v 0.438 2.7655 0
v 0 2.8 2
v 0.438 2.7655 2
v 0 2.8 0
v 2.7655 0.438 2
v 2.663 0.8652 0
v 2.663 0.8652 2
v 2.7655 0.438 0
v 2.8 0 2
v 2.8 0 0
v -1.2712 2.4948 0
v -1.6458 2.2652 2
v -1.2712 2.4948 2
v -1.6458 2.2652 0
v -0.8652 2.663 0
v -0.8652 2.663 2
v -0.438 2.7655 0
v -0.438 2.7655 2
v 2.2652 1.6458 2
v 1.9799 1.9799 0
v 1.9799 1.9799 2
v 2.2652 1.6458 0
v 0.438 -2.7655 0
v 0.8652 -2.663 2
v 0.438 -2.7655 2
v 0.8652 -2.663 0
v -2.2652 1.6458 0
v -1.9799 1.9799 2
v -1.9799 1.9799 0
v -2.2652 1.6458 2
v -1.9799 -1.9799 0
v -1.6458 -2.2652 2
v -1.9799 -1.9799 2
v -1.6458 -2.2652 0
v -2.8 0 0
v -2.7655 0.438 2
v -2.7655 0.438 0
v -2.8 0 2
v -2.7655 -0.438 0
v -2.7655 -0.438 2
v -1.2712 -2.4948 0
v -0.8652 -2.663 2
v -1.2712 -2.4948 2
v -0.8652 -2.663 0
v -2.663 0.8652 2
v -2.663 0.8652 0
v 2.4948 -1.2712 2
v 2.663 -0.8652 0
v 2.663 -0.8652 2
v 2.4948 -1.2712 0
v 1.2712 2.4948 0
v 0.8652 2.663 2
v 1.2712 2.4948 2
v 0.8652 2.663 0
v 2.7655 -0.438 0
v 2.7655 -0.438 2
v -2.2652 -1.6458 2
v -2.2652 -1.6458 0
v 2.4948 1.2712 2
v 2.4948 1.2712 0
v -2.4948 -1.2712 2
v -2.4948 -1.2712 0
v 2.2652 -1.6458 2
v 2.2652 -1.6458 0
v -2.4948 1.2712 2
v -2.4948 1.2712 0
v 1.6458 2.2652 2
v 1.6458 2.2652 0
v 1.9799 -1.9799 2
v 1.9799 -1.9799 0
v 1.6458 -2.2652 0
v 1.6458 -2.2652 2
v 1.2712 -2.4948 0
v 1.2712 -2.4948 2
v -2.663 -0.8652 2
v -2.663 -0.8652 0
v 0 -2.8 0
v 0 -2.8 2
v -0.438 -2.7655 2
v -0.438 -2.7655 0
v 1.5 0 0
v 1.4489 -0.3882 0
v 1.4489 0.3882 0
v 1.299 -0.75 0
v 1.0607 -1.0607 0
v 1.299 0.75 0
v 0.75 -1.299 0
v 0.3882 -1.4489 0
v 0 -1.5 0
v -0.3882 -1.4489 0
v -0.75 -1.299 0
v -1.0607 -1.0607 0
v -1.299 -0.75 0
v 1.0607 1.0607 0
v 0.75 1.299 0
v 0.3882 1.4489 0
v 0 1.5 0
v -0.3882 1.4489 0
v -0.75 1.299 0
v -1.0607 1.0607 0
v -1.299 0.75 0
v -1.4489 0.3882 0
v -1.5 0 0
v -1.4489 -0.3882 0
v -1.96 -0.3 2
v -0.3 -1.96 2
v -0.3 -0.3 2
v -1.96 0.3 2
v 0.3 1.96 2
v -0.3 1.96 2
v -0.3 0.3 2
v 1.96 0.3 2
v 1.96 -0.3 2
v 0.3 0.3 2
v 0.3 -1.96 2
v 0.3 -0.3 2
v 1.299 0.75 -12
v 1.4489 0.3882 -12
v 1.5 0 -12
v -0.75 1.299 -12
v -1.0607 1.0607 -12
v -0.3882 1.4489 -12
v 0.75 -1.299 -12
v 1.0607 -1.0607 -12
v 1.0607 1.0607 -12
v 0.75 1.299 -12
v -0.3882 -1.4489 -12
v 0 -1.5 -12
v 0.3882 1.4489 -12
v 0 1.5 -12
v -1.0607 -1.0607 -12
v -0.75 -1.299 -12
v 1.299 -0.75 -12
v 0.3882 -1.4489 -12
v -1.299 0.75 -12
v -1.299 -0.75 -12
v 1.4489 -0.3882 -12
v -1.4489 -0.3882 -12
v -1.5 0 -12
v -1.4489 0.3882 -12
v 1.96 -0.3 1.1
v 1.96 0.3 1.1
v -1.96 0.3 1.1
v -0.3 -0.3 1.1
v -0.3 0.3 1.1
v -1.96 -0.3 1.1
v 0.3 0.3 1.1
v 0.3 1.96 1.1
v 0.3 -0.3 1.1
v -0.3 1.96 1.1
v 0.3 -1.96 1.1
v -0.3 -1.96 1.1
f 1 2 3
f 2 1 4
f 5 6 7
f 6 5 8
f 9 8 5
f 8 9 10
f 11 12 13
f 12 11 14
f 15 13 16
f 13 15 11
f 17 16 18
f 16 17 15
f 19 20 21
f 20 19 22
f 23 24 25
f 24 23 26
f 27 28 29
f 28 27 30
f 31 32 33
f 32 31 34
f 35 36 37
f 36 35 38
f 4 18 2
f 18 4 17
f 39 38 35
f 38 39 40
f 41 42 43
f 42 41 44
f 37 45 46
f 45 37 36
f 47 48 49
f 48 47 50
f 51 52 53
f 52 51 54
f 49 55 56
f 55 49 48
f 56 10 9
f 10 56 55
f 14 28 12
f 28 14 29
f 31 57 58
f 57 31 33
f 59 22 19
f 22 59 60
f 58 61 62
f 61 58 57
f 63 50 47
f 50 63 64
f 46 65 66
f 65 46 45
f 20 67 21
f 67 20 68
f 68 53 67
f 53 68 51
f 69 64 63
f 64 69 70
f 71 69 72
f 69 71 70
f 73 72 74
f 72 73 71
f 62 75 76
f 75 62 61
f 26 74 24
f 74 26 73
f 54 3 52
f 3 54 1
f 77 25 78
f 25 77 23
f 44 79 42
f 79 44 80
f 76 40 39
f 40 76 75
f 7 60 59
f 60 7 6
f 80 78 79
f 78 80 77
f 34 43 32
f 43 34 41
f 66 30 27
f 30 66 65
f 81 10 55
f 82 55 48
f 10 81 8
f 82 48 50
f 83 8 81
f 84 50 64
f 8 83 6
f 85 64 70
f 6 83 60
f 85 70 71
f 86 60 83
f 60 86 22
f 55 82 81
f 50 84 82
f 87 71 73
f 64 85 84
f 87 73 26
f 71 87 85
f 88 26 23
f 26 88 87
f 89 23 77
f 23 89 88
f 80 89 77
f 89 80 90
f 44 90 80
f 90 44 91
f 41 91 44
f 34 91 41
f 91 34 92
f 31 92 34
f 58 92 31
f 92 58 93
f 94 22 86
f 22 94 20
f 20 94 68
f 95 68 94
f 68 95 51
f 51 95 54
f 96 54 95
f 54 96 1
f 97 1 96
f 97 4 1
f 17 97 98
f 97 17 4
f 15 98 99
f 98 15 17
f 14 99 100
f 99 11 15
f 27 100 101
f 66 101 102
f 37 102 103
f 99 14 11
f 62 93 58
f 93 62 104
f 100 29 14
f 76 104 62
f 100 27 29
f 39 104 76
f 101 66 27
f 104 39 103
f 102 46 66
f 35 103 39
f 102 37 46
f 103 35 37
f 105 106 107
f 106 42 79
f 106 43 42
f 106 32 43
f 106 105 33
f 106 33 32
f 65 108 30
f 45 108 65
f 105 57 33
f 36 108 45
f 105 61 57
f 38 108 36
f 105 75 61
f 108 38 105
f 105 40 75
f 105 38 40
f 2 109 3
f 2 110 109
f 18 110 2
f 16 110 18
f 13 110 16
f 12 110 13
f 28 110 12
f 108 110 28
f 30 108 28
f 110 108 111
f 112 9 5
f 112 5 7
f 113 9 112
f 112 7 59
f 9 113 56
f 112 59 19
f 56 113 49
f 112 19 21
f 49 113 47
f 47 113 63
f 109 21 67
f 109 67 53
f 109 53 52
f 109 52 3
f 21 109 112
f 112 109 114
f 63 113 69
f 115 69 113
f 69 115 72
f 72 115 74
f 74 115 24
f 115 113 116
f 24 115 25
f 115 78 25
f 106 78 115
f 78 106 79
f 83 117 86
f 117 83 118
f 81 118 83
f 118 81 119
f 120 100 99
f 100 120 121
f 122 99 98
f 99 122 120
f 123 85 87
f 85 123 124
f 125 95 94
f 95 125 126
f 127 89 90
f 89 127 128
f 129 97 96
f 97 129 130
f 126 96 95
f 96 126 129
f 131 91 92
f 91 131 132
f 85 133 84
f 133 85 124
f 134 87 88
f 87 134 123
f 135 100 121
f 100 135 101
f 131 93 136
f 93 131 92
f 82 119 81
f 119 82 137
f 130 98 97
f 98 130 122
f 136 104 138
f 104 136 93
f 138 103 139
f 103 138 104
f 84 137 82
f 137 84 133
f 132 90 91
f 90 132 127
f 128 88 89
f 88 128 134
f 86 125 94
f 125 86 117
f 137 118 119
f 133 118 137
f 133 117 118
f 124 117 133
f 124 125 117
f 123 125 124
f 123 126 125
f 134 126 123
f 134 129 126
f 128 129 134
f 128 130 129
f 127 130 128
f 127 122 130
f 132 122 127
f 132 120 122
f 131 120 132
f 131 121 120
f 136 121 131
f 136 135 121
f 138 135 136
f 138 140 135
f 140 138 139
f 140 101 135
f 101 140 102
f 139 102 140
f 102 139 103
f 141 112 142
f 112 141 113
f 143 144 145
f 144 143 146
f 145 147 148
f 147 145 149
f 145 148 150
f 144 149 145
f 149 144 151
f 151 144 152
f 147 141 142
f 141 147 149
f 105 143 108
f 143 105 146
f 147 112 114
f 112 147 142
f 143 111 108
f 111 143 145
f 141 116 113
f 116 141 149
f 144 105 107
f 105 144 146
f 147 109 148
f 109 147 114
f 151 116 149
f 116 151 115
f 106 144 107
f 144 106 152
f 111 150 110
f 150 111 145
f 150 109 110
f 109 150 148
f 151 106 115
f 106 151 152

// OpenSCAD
// Fasteners for the gripper (millimetres). Origin: the screw axis; z = 0 is the UNDERSIDE of the head, the shank
// points down (-z), so a screw drops through a plate just as it is. Nuts and washers have z = 0 as their bottom face.
// Change the numbers to match your hardware.

module pan_head_screw(d, length, head_d, head_h) {
    // round (pan) head with a cross slot, plain shank
    difference() {
        union() {
            translate([0, 0, 0]) cylinder(d = head_d, h = head_h, $fn = 40);
            translate([0, 0, -length]) cylinder(d = d, h = length + 0.01, $fn = 24);
        }
        translate([-head_d * 0.35, -0.3, head_h - 0.9]) cube([head_d * 0.7, 0.6, 1]);
        translate([-0.3, -head_d * 0.35, head_h - 0.9]) cube([0.6, head_d * 0.7, 1]);
    }
}

module hex_nut(af, h, hole_d) {
    difference() {
        cylinder(d = af / cos(30), h = h, $fn = 6);
        translate([0, 0, -1]) cylinder(d = hole_d, h = h + 2, $fn = 24);
    }
}

module washer(outer_d, hole_d, h) {
    difference() {
        cylinder(d = outer_d, h = h, $fn = 40);
        translate([0, 0, -1]) cylinder(d = hole_d, h = h + 2, $fn = 24);
    }
}

which = "m3x12";
if (which == "m3x12") pan_head_screw(3, 12, 5.6, 2.0);       // jaw / gear pivots ("12 mm" screw in the assembly photo)
if (which == "m2x8")  pan_head_screw(2, 8, 3.8, 1.5);        // servo mounting / horn
if (which == "nut_m3") hex_nut(5.5, 2.4, 3);
if (which == "nut_m2") hex_nut(4, 1.6, 2);
if (which == "washer_m3") washer(7, 3.2, 0.5);
if (which == "m3x6")  pan_head_screw(3, 6, 5.6, 2.0);        // bridge standoff bolts
if (which == "m3x10") pan_head_screw(3, 10, 5.6, 2.0);       // the pin through the big gear's centre
if (which == "m2_5x12") pan_head_screw(2.5, 12, 4.6, 1.5);   // gear 30 / gear 29 / big gear bolts
if (which == "nut_m2_5") hex_nut(5, 2.0, 2.5);
if (which == "standoff_m3x15") hex_nut(5.5, 15, 3);          // female-female hex standoff
if (which == "m3x14") pan_head_screw(3, 14, 5.6, 2.0);       // the pin through the big gear's centre
if (which == "m2_5x16") pan_head_screw(2.5, 16, 4.6, 1.5);   // gear 30 / gear 29 / big gear bolts
if (which == "standoff_m3x20") hex_nut(5.5, 20, 3);
if (which == "m3x8") pan_head_screw(3, 8, 5.6, 2.0);
if (which == "standoff_m3x14") hex_nut(5.5, 14, 3);
standoff_h = 12;
if (which == "m2x5") pan_head_screw(2, 5, 3.8, 1.5);        // servo ears -> bracket (self-tapping into a 1.6 mm hole)
if (which == "m2x6") pan_head_screw(2, 6, 3.8, 1.5);        // plate 24 -> bracket
if (which == "m2_5x8") pan_head_screw(2.5, 8, 4.6, 1.5);    // gear 30/29 -> big gear (self-tapping into 2.1 mm holes)
if (which == "standoff") hex_nut(5.5, standoff_h, 3);        // threaded hex standoff
